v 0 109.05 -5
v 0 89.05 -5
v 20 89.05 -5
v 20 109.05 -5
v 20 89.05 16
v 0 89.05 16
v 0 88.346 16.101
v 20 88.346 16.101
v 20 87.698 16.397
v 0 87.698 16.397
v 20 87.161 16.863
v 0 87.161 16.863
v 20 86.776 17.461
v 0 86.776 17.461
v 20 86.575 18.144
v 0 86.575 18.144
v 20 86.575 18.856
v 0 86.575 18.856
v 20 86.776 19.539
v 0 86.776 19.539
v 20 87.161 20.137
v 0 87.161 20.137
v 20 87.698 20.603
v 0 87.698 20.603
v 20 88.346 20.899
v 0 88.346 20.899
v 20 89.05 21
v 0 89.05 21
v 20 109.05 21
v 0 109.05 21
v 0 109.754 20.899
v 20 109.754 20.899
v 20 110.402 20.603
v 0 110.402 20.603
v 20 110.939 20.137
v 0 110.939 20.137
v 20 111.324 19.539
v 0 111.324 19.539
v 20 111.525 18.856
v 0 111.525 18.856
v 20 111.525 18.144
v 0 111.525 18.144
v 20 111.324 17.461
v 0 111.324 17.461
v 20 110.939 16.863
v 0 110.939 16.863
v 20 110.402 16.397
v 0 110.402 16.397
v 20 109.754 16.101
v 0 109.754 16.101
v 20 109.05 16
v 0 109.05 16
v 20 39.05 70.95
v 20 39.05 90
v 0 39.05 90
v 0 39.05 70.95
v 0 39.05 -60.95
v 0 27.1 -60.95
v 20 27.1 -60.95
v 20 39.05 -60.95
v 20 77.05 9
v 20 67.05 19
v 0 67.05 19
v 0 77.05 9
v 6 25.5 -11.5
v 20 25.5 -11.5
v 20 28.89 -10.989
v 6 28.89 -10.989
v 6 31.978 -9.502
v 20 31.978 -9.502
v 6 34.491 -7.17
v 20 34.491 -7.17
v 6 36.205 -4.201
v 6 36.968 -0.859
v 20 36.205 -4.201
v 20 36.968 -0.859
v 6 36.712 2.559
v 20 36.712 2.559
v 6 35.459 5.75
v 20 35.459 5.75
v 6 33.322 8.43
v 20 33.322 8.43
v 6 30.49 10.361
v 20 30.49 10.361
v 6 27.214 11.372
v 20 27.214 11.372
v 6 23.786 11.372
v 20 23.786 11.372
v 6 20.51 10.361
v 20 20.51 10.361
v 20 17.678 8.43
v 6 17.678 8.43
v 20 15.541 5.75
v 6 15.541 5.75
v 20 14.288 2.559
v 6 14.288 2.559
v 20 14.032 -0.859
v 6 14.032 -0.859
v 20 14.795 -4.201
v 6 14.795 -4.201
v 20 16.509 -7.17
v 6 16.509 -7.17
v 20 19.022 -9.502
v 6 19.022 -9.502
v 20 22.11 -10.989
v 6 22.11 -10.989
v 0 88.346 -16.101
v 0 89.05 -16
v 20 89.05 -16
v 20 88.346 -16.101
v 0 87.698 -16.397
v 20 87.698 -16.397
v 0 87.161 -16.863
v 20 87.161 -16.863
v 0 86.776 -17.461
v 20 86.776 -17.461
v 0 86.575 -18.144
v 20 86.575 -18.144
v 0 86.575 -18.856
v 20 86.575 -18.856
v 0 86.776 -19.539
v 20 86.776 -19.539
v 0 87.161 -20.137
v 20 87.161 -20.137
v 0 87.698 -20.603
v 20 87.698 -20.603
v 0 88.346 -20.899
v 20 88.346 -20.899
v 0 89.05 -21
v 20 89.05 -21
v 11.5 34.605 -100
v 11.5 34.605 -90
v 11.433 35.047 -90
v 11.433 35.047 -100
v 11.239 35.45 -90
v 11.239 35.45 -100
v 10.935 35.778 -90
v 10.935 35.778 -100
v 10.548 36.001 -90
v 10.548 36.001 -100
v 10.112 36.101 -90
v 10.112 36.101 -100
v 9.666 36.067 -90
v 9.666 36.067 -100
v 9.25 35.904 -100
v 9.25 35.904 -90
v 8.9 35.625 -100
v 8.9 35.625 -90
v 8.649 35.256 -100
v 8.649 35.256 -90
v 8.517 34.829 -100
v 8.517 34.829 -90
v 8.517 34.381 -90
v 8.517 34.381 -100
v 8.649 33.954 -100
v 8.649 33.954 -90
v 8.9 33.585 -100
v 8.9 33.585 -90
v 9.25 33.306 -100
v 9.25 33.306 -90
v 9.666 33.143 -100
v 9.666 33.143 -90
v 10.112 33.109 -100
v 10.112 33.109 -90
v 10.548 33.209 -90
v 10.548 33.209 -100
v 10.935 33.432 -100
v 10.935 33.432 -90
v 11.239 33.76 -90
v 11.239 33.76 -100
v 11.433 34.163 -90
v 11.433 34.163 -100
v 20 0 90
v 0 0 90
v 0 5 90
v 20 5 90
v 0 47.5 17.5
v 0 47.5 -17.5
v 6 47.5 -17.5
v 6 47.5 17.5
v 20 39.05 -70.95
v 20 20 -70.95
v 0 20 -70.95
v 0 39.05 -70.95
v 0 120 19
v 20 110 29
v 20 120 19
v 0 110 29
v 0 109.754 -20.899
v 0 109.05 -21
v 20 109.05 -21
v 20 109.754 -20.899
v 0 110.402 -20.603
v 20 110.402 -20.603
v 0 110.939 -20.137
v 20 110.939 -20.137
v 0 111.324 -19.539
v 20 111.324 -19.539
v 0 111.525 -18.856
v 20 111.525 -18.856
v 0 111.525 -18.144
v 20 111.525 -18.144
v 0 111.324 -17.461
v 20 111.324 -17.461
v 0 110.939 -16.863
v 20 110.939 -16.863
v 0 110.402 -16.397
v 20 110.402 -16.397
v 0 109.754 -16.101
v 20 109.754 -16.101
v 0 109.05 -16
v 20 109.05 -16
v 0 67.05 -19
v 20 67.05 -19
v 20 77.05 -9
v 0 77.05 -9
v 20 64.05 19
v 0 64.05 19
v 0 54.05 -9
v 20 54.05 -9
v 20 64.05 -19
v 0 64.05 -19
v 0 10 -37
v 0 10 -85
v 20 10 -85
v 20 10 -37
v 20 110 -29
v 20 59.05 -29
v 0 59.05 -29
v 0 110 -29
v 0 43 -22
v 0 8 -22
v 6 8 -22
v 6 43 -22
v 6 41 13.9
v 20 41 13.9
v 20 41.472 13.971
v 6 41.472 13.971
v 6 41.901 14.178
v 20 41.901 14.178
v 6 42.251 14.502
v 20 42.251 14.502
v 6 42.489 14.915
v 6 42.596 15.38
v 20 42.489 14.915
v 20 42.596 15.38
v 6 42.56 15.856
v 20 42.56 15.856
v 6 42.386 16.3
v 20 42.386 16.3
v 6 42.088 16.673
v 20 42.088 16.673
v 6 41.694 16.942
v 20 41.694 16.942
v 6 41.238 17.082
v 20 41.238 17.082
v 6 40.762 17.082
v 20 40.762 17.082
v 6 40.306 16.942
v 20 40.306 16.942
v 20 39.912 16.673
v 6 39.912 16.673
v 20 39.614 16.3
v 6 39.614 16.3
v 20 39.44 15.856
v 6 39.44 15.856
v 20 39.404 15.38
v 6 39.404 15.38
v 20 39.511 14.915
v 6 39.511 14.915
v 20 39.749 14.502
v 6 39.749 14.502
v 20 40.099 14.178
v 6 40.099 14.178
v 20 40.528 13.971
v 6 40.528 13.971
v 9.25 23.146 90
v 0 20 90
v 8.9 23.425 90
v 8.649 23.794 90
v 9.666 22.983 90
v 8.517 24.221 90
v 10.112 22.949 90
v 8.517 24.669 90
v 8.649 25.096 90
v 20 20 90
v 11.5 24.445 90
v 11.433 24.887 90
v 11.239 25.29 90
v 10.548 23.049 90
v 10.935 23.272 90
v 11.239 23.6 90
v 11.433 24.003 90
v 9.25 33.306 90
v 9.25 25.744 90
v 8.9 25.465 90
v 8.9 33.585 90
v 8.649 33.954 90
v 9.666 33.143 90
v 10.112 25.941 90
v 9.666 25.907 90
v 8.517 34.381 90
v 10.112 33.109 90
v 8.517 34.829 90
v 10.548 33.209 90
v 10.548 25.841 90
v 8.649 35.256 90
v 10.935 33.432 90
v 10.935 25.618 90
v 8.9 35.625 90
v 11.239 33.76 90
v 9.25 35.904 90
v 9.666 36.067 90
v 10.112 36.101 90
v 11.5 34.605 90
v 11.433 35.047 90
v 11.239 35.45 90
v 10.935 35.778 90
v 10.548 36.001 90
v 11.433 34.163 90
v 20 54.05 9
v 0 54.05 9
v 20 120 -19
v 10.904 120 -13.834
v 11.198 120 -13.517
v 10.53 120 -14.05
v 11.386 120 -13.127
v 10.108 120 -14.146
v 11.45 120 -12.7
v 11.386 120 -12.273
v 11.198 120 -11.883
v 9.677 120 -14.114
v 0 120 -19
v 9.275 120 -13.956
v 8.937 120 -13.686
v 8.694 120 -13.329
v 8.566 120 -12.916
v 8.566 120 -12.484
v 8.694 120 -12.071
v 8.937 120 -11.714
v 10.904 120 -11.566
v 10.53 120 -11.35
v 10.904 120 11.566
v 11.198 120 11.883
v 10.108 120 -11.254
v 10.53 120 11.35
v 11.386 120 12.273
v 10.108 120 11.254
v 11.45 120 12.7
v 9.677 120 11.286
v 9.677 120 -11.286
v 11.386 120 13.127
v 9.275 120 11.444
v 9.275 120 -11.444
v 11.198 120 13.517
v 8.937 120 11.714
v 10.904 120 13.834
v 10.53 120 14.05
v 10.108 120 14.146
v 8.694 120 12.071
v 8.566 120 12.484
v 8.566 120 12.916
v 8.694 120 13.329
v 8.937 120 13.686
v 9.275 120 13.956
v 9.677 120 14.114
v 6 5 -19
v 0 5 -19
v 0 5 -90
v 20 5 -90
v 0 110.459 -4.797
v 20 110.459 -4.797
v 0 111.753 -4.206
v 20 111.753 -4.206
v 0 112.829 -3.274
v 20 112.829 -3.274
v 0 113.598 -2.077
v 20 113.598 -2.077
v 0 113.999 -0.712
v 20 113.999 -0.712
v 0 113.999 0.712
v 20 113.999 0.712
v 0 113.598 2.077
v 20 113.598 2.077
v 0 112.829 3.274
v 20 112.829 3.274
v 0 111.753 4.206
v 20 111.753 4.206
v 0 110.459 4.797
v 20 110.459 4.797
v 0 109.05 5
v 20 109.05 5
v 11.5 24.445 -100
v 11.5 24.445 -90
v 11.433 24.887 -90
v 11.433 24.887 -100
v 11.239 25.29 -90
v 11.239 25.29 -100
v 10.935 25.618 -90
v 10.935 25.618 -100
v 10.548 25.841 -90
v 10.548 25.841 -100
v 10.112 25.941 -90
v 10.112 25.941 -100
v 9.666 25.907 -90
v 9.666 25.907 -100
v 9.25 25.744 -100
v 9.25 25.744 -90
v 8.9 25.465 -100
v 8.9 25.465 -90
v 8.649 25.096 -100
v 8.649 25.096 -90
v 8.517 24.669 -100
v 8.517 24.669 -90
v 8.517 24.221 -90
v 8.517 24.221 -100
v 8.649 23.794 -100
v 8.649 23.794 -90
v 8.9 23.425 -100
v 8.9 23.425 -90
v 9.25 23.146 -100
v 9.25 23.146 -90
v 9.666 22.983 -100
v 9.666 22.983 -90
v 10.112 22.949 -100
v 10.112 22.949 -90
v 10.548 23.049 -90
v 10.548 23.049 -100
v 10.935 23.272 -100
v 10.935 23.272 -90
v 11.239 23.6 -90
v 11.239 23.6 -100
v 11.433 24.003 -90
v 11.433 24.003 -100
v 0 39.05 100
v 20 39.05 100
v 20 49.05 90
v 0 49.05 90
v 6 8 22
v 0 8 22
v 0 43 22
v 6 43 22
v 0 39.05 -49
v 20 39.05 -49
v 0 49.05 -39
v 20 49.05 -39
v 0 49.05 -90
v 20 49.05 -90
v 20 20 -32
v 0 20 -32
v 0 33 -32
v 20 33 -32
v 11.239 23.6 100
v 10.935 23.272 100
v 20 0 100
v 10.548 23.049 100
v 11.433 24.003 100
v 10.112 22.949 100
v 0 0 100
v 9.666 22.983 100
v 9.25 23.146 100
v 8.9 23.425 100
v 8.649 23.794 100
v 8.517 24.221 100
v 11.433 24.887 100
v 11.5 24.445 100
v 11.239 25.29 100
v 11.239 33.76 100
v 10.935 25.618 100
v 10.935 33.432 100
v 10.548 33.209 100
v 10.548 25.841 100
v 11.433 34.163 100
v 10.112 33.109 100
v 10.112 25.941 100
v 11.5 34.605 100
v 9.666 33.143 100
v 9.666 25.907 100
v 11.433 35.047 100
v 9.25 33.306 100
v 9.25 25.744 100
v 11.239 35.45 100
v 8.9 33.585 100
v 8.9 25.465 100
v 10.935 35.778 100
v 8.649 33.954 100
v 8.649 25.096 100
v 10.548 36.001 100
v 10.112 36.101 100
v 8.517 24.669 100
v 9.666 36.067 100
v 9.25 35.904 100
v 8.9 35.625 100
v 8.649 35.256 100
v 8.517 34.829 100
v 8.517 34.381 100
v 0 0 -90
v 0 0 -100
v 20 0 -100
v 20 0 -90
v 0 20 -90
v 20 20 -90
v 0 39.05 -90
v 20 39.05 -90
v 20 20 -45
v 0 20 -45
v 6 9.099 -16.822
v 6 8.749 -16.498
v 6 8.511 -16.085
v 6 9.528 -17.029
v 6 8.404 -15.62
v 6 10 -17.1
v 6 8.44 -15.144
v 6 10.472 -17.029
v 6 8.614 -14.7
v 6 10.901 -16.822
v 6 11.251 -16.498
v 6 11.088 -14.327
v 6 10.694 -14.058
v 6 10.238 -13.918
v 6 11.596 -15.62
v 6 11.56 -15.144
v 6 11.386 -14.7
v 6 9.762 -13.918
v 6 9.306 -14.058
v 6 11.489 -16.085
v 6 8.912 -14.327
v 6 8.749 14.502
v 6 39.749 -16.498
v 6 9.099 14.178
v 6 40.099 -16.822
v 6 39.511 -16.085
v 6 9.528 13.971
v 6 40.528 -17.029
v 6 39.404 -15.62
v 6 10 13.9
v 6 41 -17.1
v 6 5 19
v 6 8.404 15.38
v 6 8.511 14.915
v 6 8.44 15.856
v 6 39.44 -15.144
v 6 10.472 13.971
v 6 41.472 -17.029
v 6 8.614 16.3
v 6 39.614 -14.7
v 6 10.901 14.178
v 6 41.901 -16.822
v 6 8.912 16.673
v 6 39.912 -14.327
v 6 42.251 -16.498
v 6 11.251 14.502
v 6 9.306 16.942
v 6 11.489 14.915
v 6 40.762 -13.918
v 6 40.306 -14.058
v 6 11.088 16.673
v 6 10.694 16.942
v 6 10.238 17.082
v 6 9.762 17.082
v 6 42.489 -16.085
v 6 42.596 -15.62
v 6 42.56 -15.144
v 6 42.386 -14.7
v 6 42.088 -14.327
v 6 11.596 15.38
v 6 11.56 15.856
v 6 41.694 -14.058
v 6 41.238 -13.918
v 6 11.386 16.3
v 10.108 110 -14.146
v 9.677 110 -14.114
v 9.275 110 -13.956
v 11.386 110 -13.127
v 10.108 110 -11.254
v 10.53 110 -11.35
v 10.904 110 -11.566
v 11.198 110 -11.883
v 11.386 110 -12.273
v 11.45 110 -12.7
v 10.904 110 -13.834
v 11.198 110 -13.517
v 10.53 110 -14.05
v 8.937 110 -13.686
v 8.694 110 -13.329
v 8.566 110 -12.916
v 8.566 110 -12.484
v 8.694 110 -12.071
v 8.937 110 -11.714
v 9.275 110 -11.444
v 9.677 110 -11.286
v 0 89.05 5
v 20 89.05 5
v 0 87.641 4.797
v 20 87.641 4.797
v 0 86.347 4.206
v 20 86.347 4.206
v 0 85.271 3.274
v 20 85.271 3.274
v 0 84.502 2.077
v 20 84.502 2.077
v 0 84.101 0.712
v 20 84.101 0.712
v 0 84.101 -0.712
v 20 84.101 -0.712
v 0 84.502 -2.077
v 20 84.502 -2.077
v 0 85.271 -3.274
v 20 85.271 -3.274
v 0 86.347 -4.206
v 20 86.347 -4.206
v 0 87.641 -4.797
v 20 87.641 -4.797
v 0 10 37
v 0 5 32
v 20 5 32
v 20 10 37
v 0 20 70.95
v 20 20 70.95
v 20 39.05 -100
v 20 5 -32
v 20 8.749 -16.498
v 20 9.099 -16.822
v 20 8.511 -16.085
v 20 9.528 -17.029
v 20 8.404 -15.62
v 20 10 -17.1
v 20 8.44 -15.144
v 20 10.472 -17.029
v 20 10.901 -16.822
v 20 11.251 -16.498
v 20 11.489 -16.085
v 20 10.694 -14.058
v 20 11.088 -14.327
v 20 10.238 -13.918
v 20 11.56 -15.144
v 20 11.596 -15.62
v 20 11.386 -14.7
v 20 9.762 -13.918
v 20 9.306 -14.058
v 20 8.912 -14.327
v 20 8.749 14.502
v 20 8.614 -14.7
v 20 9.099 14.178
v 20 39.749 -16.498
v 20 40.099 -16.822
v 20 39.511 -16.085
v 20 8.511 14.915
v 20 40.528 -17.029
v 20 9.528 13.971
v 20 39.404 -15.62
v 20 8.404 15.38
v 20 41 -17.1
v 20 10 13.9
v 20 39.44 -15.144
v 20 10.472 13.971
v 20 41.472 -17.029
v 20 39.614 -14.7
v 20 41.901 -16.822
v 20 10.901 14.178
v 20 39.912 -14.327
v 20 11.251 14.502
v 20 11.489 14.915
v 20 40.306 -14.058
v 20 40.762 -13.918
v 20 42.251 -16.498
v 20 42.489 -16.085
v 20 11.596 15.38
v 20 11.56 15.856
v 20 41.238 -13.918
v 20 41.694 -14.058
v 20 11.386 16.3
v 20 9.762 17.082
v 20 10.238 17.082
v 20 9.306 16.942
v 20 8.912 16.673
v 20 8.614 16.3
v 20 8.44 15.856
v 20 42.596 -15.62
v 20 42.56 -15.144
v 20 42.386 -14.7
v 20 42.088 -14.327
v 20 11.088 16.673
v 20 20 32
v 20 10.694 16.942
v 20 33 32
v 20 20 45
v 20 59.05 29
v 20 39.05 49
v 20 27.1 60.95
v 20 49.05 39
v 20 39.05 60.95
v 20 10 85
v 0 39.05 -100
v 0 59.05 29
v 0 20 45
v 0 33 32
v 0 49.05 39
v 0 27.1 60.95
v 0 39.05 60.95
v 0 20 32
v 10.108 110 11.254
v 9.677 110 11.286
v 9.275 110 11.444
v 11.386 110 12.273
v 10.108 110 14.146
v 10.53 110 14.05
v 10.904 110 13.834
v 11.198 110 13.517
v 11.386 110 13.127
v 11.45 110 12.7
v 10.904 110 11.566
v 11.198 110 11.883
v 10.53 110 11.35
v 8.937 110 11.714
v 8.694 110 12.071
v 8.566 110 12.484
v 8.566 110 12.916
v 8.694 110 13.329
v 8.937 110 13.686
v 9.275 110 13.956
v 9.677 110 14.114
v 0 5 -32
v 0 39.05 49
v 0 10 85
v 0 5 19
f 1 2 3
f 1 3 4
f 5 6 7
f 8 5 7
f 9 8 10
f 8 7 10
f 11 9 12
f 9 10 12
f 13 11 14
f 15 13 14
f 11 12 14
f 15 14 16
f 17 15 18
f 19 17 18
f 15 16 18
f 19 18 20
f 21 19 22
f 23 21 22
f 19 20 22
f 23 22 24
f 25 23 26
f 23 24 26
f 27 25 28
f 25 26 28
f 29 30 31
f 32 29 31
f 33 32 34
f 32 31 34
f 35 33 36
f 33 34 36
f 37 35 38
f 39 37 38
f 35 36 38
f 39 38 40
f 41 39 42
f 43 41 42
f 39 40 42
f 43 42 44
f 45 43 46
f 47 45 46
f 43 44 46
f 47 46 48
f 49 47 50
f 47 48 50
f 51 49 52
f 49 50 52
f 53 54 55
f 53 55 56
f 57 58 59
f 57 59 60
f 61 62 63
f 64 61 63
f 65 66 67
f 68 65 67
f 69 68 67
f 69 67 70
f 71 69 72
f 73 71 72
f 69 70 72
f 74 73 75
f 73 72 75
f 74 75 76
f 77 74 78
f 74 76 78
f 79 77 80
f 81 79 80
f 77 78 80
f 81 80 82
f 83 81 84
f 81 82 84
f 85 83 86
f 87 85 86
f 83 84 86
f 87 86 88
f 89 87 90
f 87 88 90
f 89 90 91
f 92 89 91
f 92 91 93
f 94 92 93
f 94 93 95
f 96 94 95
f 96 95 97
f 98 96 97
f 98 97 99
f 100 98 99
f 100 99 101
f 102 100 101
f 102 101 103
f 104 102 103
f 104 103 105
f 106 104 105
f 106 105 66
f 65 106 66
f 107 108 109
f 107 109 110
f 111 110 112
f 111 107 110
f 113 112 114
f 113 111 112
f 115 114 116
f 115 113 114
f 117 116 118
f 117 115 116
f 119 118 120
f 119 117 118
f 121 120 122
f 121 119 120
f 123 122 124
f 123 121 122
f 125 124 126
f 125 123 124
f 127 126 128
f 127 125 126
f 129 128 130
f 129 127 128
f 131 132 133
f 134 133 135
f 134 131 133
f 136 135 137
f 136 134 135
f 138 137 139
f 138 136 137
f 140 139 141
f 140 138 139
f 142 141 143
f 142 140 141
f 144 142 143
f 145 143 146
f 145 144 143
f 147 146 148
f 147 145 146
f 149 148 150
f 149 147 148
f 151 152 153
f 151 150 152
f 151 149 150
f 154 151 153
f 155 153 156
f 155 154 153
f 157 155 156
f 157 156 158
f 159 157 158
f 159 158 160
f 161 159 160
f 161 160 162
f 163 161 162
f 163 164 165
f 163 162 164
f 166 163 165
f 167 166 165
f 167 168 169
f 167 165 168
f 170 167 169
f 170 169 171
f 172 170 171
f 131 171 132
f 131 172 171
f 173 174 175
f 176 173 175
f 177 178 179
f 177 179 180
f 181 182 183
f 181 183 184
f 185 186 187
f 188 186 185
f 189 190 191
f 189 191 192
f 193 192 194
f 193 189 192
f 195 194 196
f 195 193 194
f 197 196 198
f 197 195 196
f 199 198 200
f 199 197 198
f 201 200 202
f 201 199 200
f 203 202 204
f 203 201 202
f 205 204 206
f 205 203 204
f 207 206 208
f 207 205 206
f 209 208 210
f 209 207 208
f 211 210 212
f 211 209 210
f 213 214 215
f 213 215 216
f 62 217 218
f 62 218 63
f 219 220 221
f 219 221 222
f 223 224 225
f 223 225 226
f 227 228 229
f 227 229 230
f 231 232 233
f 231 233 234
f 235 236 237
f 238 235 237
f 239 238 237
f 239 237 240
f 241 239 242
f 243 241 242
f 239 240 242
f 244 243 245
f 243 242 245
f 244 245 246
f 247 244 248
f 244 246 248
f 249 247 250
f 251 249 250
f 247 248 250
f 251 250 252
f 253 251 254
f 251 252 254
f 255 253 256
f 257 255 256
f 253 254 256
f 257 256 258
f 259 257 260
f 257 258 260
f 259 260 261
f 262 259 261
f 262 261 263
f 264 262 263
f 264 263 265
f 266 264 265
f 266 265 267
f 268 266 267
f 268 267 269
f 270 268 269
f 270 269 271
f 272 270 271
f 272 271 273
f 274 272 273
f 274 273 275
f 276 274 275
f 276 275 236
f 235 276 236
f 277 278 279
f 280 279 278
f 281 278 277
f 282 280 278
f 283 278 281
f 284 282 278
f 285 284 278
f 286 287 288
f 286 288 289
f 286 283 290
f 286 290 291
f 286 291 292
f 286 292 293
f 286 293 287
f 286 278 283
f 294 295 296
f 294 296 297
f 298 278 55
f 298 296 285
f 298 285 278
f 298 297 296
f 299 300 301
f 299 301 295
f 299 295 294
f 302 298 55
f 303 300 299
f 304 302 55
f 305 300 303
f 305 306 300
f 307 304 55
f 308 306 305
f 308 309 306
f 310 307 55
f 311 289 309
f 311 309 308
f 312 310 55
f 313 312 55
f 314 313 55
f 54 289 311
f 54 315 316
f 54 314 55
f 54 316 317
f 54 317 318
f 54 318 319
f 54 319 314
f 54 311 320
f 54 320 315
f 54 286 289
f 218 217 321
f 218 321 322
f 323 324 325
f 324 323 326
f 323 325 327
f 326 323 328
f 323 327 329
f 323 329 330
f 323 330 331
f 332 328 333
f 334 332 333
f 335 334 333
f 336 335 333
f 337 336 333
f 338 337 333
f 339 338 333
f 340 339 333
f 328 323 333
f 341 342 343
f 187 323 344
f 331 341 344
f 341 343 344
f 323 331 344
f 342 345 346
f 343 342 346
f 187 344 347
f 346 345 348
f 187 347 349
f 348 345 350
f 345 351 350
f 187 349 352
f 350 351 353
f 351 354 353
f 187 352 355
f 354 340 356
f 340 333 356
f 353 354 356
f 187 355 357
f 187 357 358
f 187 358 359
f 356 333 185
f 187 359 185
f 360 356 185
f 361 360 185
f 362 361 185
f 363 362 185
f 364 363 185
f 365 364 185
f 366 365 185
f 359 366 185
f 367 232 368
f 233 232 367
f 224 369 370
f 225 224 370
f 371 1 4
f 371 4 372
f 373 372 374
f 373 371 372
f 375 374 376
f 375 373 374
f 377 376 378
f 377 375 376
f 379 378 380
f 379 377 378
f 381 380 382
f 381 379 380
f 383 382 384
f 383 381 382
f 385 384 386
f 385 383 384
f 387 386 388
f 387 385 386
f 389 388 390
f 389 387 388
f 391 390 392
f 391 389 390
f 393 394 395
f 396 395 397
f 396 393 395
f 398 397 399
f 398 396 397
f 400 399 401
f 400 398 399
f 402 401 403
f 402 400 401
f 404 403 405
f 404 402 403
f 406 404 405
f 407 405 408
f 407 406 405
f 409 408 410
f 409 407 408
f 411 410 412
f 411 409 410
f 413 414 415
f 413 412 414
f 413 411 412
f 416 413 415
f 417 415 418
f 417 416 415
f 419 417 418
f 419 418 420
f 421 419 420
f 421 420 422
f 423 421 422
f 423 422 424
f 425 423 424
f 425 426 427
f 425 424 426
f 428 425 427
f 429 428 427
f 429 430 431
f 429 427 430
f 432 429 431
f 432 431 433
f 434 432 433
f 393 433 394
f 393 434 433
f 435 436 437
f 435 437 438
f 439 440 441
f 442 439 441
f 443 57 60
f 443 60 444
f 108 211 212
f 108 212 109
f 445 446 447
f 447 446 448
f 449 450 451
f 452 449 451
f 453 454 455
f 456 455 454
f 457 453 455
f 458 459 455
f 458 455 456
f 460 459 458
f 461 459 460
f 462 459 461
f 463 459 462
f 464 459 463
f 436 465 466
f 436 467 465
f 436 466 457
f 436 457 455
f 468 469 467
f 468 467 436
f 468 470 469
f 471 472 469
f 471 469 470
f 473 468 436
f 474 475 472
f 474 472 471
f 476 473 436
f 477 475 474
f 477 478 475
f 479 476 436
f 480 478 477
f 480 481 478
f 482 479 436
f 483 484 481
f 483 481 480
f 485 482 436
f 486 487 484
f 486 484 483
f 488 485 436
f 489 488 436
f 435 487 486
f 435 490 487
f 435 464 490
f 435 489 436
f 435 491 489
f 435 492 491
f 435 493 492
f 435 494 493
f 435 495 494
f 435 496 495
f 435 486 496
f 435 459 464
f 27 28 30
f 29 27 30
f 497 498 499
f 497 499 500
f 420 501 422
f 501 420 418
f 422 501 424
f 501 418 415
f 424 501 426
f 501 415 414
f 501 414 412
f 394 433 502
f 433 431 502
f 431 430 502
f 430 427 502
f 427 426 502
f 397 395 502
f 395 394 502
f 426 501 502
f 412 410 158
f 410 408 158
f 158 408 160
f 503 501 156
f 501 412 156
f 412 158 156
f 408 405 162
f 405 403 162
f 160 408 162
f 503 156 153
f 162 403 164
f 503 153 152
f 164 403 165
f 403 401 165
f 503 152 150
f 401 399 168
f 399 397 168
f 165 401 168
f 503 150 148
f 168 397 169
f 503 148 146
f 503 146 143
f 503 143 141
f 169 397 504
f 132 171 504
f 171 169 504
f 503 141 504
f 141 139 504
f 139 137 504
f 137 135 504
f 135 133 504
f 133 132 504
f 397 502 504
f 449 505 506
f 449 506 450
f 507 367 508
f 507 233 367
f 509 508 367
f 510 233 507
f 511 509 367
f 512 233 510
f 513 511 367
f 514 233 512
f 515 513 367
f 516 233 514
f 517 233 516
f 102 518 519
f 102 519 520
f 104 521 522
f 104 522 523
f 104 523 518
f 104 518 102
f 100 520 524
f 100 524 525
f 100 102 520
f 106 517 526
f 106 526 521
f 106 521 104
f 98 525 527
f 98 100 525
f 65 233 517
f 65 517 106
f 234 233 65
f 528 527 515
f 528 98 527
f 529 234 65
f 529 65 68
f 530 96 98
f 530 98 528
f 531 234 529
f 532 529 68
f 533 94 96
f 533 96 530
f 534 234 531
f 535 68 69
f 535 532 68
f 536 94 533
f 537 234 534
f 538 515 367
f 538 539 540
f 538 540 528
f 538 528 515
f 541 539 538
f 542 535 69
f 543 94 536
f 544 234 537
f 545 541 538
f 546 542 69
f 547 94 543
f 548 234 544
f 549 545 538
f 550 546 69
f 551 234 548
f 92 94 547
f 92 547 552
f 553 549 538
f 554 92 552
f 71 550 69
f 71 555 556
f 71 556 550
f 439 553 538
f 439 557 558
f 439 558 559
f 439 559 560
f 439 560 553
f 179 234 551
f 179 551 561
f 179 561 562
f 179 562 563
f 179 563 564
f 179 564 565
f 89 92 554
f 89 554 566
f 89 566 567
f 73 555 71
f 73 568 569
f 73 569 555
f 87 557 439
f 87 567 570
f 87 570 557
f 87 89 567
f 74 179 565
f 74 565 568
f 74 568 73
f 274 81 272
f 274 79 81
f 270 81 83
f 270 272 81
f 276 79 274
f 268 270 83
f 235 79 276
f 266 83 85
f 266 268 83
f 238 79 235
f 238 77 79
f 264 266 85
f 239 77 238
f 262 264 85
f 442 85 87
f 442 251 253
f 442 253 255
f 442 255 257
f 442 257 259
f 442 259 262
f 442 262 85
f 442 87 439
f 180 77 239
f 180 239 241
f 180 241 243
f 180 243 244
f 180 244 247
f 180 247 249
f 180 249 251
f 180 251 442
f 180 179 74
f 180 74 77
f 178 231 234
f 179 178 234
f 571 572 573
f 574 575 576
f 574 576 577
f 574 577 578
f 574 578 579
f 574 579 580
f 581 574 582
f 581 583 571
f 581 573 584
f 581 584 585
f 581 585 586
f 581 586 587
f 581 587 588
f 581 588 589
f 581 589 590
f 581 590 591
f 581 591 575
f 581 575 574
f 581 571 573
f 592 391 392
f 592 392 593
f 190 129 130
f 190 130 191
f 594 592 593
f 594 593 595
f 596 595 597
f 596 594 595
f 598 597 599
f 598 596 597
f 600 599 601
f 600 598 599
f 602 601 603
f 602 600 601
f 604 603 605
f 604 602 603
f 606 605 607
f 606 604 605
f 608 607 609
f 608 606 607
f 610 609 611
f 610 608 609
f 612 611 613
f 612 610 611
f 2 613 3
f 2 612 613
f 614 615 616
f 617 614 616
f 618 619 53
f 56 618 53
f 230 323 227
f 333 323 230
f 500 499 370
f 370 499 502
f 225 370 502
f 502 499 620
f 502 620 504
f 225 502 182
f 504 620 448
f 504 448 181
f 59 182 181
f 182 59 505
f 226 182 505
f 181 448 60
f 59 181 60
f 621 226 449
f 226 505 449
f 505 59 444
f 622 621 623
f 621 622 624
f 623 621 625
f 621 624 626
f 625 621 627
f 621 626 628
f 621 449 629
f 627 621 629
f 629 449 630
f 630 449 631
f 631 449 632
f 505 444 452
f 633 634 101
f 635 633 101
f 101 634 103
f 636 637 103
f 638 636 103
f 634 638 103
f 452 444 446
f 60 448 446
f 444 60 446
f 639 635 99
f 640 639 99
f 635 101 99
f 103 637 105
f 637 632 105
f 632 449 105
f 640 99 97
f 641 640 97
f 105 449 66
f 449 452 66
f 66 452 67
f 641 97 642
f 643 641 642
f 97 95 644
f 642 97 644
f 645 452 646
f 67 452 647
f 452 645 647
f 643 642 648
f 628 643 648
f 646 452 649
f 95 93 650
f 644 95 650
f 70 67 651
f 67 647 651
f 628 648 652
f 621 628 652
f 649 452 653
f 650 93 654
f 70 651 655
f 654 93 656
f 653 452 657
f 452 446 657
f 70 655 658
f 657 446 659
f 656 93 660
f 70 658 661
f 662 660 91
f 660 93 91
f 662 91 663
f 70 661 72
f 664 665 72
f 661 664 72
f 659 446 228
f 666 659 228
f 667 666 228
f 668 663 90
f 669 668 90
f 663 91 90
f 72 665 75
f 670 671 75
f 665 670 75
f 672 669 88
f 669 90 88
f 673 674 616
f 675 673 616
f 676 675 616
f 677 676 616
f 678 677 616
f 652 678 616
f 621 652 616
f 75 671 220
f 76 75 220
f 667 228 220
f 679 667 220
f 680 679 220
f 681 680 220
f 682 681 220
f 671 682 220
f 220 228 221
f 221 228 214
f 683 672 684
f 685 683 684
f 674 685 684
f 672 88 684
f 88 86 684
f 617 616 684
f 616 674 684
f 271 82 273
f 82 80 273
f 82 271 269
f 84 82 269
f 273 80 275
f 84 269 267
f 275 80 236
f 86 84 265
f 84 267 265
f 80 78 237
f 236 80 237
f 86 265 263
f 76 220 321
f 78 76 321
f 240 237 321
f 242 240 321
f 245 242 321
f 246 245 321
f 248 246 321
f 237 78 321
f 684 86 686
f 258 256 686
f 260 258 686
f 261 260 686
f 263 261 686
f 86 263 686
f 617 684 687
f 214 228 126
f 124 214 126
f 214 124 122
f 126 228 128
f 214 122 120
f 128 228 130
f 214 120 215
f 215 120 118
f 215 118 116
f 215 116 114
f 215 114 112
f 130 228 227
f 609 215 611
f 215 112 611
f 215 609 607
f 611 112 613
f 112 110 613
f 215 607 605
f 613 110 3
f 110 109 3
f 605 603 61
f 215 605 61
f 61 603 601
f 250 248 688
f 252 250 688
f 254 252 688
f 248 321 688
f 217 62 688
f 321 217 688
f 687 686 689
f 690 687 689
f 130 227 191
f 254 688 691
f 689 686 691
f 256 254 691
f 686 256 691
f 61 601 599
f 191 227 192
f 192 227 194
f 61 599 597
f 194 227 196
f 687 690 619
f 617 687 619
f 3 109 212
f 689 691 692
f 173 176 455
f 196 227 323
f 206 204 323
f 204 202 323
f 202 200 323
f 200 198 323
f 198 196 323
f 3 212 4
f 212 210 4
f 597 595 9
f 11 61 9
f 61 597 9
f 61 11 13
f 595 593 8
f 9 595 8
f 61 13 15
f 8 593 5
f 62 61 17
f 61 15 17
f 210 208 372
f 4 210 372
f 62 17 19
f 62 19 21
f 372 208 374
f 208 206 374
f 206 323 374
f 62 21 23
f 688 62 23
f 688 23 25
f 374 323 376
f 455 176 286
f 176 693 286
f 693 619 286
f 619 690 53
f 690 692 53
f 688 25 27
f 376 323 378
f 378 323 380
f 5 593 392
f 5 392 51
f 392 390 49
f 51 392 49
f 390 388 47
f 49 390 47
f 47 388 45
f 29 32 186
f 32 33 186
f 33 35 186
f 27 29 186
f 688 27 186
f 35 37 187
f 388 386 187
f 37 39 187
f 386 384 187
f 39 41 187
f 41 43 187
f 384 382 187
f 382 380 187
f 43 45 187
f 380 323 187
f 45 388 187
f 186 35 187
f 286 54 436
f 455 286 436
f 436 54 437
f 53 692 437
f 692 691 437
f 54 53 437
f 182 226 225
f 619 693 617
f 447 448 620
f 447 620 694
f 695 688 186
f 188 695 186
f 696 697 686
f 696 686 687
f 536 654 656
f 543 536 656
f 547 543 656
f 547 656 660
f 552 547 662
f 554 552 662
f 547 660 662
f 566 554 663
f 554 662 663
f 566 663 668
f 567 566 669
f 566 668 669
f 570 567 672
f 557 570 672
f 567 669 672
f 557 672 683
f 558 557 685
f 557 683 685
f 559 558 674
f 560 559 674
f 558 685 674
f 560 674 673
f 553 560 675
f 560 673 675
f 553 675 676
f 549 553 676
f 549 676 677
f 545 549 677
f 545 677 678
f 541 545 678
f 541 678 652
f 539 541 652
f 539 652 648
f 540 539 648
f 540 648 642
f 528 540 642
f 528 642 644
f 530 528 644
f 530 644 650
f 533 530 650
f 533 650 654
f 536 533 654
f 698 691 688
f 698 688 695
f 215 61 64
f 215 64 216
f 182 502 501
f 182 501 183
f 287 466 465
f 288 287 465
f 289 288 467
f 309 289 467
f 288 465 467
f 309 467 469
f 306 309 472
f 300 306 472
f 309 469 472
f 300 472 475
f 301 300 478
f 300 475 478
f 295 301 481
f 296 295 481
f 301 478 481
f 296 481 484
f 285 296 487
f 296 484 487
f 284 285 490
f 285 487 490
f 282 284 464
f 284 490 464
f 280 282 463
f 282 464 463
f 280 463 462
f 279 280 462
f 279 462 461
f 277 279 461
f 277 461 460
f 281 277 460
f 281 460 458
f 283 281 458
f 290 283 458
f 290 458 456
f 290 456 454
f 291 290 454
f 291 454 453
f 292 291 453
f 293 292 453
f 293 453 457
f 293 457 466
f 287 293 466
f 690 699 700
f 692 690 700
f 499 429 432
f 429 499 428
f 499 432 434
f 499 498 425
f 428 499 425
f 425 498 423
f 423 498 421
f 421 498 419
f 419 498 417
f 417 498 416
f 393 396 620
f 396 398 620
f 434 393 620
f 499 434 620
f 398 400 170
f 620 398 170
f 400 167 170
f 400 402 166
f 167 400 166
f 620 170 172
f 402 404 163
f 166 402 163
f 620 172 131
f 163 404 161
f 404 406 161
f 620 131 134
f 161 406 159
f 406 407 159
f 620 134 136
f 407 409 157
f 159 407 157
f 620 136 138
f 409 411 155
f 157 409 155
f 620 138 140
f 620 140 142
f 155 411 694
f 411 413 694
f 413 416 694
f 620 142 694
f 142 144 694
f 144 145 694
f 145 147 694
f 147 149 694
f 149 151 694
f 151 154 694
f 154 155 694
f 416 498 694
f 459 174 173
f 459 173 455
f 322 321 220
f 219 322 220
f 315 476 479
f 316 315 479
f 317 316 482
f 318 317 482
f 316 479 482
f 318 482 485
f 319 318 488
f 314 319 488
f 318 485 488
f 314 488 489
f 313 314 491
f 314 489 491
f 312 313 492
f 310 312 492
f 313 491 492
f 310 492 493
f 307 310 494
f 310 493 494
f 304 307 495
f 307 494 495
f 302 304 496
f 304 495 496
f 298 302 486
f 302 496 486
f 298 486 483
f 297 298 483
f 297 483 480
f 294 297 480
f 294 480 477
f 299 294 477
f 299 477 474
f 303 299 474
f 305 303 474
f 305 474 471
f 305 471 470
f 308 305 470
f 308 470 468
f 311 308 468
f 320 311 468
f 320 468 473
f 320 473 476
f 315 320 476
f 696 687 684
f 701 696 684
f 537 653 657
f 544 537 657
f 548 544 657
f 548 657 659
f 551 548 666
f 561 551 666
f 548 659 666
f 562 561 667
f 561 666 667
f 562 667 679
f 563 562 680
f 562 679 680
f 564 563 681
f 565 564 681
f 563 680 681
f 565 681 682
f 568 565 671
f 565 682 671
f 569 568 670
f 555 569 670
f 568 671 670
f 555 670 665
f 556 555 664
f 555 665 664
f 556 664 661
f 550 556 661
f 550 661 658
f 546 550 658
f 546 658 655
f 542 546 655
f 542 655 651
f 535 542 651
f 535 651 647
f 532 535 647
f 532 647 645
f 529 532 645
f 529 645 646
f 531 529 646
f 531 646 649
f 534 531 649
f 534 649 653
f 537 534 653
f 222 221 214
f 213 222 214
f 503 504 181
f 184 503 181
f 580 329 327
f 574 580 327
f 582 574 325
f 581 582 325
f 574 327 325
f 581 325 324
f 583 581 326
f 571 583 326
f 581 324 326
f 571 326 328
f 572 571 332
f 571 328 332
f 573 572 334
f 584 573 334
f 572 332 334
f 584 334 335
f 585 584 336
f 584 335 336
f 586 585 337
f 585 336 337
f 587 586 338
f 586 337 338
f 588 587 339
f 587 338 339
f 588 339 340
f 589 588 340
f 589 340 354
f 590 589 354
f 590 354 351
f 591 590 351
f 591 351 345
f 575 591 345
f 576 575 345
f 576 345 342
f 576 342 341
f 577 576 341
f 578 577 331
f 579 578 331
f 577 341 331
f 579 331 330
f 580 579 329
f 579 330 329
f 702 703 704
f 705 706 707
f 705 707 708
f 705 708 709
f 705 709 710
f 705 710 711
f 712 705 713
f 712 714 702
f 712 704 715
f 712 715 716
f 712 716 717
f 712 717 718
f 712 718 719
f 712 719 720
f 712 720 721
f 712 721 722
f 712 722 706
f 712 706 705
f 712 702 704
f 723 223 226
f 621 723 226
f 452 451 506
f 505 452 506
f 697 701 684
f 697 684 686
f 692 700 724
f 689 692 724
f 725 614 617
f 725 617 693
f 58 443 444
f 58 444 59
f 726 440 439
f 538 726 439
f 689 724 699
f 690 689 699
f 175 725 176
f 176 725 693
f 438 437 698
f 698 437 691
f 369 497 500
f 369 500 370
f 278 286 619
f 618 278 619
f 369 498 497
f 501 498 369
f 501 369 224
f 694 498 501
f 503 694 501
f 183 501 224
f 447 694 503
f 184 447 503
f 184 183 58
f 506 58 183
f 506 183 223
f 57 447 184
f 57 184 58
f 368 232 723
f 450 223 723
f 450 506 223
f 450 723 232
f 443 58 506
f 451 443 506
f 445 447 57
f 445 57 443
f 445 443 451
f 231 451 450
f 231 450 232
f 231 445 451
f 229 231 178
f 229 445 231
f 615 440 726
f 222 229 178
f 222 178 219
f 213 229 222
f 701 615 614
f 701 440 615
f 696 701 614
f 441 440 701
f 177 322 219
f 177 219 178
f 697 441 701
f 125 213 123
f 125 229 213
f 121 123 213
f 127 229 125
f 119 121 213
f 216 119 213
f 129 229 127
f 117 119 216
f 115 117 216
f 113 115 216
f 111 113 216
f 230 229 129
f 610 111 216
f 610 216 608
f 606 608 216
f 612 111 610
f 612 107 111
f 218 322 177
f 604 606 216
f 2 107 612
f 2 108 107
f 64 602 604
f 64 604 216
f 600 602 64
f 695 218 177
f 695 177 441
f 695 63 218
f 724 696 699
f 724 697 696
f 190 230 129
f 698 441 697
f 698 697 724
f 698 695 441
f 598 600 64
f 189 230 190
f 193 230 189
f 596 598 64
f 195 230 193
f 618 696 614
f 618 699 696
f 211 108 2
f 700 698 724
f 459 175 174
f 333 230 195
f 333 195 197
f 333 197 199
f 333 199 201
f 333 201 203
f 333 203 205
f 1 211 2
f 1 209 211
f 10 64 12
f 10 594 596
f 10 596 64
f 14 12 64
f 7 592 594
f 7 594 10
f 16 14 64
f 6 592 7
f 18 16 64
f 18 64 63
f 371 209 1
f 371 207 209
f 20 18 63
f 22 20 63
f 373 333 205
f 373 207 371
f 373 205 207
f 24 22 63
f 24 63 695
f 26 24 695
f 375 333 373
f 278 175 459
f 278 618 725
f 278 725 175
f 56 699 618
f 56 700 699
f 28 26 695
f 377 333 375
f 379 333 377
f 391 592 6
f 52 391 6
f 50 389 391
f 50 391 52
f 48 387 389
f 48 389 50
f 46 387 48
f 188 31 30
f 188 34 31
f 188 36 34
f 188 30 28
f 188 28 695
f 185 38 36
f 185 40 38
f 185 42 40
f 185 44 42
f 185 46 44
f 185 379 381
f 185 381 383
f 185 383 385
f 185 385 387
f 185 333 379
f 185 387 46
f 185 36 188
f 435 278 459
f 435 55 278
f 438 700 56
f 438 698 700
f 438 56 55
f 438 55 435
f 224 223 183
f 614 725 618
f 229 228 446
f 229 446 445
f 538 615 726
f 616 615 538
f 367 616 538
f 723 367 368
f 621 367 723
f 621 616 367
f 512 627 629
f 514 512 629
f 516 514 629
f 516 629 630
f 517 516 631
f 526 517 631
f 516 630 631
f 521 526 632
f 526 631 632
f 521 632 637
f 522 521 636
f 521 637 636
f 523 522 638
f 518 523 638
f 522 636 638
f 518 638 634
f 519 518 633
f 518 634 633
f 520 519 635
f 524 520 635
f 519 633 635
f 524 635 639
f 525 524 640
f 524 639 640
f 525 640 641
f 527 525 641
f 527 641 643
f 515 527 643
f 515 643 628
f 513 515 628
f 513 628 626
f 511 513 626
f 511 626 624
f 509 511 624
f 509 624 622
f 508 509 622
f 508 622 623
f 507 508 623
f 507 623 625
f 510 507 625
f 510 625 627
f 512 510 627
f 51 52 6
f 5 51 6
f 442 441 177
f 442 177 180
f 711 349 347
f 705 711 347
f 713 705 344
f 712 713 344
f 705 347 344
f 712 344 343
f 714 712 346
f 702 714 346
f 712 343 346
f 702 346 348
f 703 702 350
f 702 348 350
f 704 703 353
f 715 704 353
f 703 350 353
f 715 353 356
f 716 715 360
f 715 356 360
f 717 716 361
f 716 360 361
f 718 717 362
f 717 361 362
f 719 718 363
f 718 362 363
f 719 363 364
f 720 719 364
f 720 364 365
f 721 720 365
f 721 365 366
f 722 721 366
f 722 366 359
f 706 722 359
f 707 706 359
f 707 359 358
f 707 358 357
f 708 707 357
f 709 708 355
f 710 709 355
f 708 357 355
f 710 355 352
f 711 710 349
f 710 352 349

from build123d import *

# Parameters (mm, degrees)
SKETCH1_W           = 100
SKETCH1_H           = 120
BOSS_EXTRUDE1_DEPTH = 20
SKETCH2_W           = 19.05
SKETCH2_H           = 19.05
CUT_EXTRUDE1_DEPTH  = 20
SKETCH3_R           = 1.5
CUT_EXTRUDE2_DEPTH  = 20
SKETCH5_R           = 11.5
SKETCH5_R_2         = 1.6
CUT_EXTRUDE3_DEPTH  = 20
SKETCH6_W           = 44
SKETCH6_H           = 44
MOTOR_INDENT_DEPTH  = 6
BEARING_BLOCK_DEPTH = 21
SKETCH8_W           = 71
SKETCH8_H           = 70.95
CUT_EXTRUDE6_DEPTH  = 21
CHAMFER1_SIZE       = 10
SKETCH10_W          = 58
SKETCH10_H          = 10
CUT_EXTRUDE7_DEPTH  = 21
CHAMFER2_SIZE       = 5
CHAMFER3_SIZE       = 4.5
SKETCH11_R          = 1.45
CUT_EXTRUDE8_DEPTH  = 10
SKETCH12_W          = 38
SKETCH12_H          = 23
CUT_EXTRUDE9_DEPTH  = 21
CHAMFER4_SIZE       = 10
CUT_EXTRUDE10_DEPTH = 21
SKETCH14_W          = 64
SKETCH14_H          = 5
CUT_EXTRUDE11_DEPTH = 21


with BuildPart() as part:
    # Sketch1 → Boss-Extrude1 (new body)
    with BuildSketch(Plane(origin=(0, 0, 0), x_dir=(0, 0, -1), z_dir=(1, 0, 0))):
        with Locations((-50, 60)):
            Rectangle(SKETCH1_W, SKETCH1_H)
    boss_extrude1 = extrude(amount=BOSS_EXTRUDE1_DEPTH)

    # Sketch2 → Cut-Extrude1 (cut)
    with BuildSketch(Plane(origin=(20, 0, 0), x_dir=(0, 0, -1), z_dir=(1, 0, 0))):
        with Locations((-80.475, 29.525)):
            Rectangle(SKETCH2_W, SKETCH2_H)
    cut_extrude1 = extrude(amount=-CUT_EXTRUDE1_DEPTH, mode=Mode.SUBTRACT)

    # Sketch3 → Cut-Extrude2 (cut)
    with BuildSketch(Plane.XY.offset(100)):
        with Locations((10, 34.605)):
            Circle(SKETCH3_R)
        with Locations((10, 24.445)):
            Circle(SKETCH3_R)
    cut_extrude2 = extrude(amount=-CUT_EXTRUDE2_DEPTH, mode=Mode.SUBTRACT)

    # Mirror1: Boss-Extrude1, Cut-Extrude1, Cut-Extrude2 across plane
    add(boss_extrude1.mirror(Plane(origin=(20, 0, 0), x_dir=(1, 0, 0), z_dir=(0, 0, 1))))
    add(cut_extrude1.mirror(Plane(origin=(20, 0, 0), x_dir=(1, 0, 0), z_dir=(0, 0, 1))), mode=Mode.SUBTRACT)
    add(cut_extrude2.mirror(Plane(origin=(20, 0, 0), x_dir=(1, 0, 0), z_dir=(0, 0, 1))), mode=Mode.SUBTRACT)

    # Sketch5 → Cut-Extrude3 (cut)
    with BuildSketch(Plane(origin=(20, 0, 0), x_dir=(0, 0, -1), z_dir=(1, 0, 0))):
        with Locations((0, 25.5)):
            Circle(SKETCH5_R)
        with Locations((-15.5, 41)):
            Circle(SKETCH5_R_2)
        with Locations((15.5, 41)):
            Circle(SKETCH5_R_2)
        with Locations((15.5, 10)):
            Circle(SKETCH5_R_2)
        with Locations((-15.5, 10)):
            Circle(SKETCH5_R_2)
    extrude(amount=-CUT_EXTRUDE3_DEPTH, mode=Mode.SUBTRACT)

    # Sketch6 → Motor indent (cut)
    with BuildSketch(Plane.ZY):
        with Locations((0, 25.5)):
            Rectangle(SKETCH6_W, SKETCH6_H)
    extrude(amount=-MOTOR_INDENT_DEPTH, mode=Mode.SUBTRACT)

    # Sketch7 → Bearing Block (cut, through all)
    with BuildSketch(Plane.ZY):
        with BuildLine():
            Line((5, 109.05), (5, 89.05))
            ThreePointArc((5, 89.05), (0, 84.05), (-5, 89.05))
            Line((-5, 89.05), (-5, 109.05))
            ThreePointArc((-5, 109.05), (0, 114.05), (5, 109.05))
        make_face()
        with BuildLine():
            Line((-16, 109.05), (-16, 89.05))
            ThreePointArc((-16, 89.05), (-18.5, 86.55), (-21, 89.05))
            Line((-21, 89.05), (-21, 109.05))
            ThreePointArc((-21, 109.05), (-18.5, 111.55), (-16, 109.05))
        make_face()
        with BuildLine():
            Line((16, 109.05), (16, 89.05))
            ThreePointArc((16, 89.05), (18.5, 86.55), (21, 89.05))
            Line((21, 89.05), (21, 109.05))
            ThreePointArc((21, 109.05), (18.5, 111.55), (16, 109.05))
        make_face()
    extrude(amount=-BEARING_BLOCK_DEPTH, mode=Mode.SUBTRACT)

    # Sketch8 → Cut-Extrude6 (cut, through all)
    with BuildSketch(Plane(origin=(20, 0, 0), x_dir=(0, 0, -1), z_dir=(1, 0, 0))):
        with Locations((-64.5, 84.525)):
            Rectangle(SKETCH8_W, SKETCH8_H)
        with Locations((64.5, 84.525)):
            Rectangle(SKETCH8_W, SKETCH8_H)
    extrude(amount=-CUT_EXTRUDE6_DEPTH, mode=Mode.SUBTRACT)

    # Chamfer1
    chamfer1_edges = [part.edges().sort_by_distance(p)[0] for p in [
        (10, 120, 29),
        (10, 49.05, 29),
        (10, 49.05, 100),
        (10, 49.05, -100),
        (10, 49.05, -29),
        (10, 120, -29),
    ]]
    chamfer(chamfer1_edges, length=CHAMFER1_SIZE)

    # Sketch10 → Cut-Extrude7 (cut, through all)
    with BuildSketch(Plane.ZY):
        with Locations((-61, 5)):
            Rectangle(SKETCH10_W, SKETCH10_H)
        with Locations((61, 5)):
            Rectangle(SKETCH10_W, SKETCH10_H)
    extrude(amount=-CUT_EXTRUDE7_DEPTH, mode=Mode.SUBTRACT)

    # Chamfer2
    chamfer2_edges = [part.edges().sort_by_distance(p)[0] for p in [
        (10, 10, -90),
        (10, 10, -32),
        (10, 10, 32),
        (10, 10, 90),
    ]]
    chamfer(chamfer2_edges, length=CHAMFER2_SIZE)

    # Chamfer3
    chamfer3_edges = [part.edges().sort_by_distance(p)[0] for p in [
        (3, 47.5, 22),
        (3, 3.5, 22),
        (3, 3.5, -22),
        (3, 47.5, -22),
    ]]
    chamfer(chamfer3_edges, length=CHAMFER3_SIZE)

    # Sketch11 → Cut-Extrude8 (cut)
    with BuildSketch(Plane(origin=(0, 120, 0), x_dir=(1, 0, 0), z_dir=(0, 1, 0))):
        with Locations((10, -12.7)):
            Circle(SKETCH11_R)
        with Locations((10, 12.7)):
            Circle(SKETCH11_R)
    extrude(amount=-CUT_EXTRUDE8_DEPTH, mode=Mode.SUBTRACT)

    # Sketch12 → Cut-Extrude9 (cut, through all)
    with BuildSketch(Plane(origin=(20, 0, 0), x_dir=(0, 0, -1), z_dir=(1, 0, 0))):
        with Locations((0, 65.55)):
            Rectangle(SKETCH12_W, SKETCH12_H)
    extrude(amount=-CUT_EXTRUDE9_DEPTH, mode=Mode.SUBTRACT)

    # Chamfer4
    chamfer4_edges = [part.edges().sort_by_distance(p)[0] for p in [
        (10, 54.05, 19),
        (10, 77.05, 19),
        (10, 77.05, -19),
        (10, 54.05, -19),
    ]]
    chamfer(chamfer4_edges, length=CHAMFER4_SIZE)

    # Sketch13 → Cut-Extrude10 (cut, through all)
    with BuildSketch(Plane.ZY):
        Polygon((-49, 39.05), (-60.95, 27.1), (-60.95, 39.05), align=None)
        Polygon((-32, 33), (-45, 20), (-32, 20), align=None)
    cut_extrude10 = extrude(amount=-CUT_EXTRUDE10_DEPTH, mode=Mode.SUBTRACT)

    # Mirror2: Cut-Extrude10 across plane
    add(cut_extrude10.mirror(Plane.XY), mode=Mode.SUBTRACT)

    # Sketch14 → Cut-Extrude11 (cut, through all)
    with BuildSketch(Plane(origin=(20, 0, 0), x_dir=(0, 0, -1), z_dir=(1, 0, 0))):
        with Locations((0, 2.5)):
            Rectangle(SKETCH14_W, SKETCH14_H)
    extrude(amount=-CUT_EXTRUDE11_DEPTH, mode=Mode.SUBTRACT)


solid = part.part
